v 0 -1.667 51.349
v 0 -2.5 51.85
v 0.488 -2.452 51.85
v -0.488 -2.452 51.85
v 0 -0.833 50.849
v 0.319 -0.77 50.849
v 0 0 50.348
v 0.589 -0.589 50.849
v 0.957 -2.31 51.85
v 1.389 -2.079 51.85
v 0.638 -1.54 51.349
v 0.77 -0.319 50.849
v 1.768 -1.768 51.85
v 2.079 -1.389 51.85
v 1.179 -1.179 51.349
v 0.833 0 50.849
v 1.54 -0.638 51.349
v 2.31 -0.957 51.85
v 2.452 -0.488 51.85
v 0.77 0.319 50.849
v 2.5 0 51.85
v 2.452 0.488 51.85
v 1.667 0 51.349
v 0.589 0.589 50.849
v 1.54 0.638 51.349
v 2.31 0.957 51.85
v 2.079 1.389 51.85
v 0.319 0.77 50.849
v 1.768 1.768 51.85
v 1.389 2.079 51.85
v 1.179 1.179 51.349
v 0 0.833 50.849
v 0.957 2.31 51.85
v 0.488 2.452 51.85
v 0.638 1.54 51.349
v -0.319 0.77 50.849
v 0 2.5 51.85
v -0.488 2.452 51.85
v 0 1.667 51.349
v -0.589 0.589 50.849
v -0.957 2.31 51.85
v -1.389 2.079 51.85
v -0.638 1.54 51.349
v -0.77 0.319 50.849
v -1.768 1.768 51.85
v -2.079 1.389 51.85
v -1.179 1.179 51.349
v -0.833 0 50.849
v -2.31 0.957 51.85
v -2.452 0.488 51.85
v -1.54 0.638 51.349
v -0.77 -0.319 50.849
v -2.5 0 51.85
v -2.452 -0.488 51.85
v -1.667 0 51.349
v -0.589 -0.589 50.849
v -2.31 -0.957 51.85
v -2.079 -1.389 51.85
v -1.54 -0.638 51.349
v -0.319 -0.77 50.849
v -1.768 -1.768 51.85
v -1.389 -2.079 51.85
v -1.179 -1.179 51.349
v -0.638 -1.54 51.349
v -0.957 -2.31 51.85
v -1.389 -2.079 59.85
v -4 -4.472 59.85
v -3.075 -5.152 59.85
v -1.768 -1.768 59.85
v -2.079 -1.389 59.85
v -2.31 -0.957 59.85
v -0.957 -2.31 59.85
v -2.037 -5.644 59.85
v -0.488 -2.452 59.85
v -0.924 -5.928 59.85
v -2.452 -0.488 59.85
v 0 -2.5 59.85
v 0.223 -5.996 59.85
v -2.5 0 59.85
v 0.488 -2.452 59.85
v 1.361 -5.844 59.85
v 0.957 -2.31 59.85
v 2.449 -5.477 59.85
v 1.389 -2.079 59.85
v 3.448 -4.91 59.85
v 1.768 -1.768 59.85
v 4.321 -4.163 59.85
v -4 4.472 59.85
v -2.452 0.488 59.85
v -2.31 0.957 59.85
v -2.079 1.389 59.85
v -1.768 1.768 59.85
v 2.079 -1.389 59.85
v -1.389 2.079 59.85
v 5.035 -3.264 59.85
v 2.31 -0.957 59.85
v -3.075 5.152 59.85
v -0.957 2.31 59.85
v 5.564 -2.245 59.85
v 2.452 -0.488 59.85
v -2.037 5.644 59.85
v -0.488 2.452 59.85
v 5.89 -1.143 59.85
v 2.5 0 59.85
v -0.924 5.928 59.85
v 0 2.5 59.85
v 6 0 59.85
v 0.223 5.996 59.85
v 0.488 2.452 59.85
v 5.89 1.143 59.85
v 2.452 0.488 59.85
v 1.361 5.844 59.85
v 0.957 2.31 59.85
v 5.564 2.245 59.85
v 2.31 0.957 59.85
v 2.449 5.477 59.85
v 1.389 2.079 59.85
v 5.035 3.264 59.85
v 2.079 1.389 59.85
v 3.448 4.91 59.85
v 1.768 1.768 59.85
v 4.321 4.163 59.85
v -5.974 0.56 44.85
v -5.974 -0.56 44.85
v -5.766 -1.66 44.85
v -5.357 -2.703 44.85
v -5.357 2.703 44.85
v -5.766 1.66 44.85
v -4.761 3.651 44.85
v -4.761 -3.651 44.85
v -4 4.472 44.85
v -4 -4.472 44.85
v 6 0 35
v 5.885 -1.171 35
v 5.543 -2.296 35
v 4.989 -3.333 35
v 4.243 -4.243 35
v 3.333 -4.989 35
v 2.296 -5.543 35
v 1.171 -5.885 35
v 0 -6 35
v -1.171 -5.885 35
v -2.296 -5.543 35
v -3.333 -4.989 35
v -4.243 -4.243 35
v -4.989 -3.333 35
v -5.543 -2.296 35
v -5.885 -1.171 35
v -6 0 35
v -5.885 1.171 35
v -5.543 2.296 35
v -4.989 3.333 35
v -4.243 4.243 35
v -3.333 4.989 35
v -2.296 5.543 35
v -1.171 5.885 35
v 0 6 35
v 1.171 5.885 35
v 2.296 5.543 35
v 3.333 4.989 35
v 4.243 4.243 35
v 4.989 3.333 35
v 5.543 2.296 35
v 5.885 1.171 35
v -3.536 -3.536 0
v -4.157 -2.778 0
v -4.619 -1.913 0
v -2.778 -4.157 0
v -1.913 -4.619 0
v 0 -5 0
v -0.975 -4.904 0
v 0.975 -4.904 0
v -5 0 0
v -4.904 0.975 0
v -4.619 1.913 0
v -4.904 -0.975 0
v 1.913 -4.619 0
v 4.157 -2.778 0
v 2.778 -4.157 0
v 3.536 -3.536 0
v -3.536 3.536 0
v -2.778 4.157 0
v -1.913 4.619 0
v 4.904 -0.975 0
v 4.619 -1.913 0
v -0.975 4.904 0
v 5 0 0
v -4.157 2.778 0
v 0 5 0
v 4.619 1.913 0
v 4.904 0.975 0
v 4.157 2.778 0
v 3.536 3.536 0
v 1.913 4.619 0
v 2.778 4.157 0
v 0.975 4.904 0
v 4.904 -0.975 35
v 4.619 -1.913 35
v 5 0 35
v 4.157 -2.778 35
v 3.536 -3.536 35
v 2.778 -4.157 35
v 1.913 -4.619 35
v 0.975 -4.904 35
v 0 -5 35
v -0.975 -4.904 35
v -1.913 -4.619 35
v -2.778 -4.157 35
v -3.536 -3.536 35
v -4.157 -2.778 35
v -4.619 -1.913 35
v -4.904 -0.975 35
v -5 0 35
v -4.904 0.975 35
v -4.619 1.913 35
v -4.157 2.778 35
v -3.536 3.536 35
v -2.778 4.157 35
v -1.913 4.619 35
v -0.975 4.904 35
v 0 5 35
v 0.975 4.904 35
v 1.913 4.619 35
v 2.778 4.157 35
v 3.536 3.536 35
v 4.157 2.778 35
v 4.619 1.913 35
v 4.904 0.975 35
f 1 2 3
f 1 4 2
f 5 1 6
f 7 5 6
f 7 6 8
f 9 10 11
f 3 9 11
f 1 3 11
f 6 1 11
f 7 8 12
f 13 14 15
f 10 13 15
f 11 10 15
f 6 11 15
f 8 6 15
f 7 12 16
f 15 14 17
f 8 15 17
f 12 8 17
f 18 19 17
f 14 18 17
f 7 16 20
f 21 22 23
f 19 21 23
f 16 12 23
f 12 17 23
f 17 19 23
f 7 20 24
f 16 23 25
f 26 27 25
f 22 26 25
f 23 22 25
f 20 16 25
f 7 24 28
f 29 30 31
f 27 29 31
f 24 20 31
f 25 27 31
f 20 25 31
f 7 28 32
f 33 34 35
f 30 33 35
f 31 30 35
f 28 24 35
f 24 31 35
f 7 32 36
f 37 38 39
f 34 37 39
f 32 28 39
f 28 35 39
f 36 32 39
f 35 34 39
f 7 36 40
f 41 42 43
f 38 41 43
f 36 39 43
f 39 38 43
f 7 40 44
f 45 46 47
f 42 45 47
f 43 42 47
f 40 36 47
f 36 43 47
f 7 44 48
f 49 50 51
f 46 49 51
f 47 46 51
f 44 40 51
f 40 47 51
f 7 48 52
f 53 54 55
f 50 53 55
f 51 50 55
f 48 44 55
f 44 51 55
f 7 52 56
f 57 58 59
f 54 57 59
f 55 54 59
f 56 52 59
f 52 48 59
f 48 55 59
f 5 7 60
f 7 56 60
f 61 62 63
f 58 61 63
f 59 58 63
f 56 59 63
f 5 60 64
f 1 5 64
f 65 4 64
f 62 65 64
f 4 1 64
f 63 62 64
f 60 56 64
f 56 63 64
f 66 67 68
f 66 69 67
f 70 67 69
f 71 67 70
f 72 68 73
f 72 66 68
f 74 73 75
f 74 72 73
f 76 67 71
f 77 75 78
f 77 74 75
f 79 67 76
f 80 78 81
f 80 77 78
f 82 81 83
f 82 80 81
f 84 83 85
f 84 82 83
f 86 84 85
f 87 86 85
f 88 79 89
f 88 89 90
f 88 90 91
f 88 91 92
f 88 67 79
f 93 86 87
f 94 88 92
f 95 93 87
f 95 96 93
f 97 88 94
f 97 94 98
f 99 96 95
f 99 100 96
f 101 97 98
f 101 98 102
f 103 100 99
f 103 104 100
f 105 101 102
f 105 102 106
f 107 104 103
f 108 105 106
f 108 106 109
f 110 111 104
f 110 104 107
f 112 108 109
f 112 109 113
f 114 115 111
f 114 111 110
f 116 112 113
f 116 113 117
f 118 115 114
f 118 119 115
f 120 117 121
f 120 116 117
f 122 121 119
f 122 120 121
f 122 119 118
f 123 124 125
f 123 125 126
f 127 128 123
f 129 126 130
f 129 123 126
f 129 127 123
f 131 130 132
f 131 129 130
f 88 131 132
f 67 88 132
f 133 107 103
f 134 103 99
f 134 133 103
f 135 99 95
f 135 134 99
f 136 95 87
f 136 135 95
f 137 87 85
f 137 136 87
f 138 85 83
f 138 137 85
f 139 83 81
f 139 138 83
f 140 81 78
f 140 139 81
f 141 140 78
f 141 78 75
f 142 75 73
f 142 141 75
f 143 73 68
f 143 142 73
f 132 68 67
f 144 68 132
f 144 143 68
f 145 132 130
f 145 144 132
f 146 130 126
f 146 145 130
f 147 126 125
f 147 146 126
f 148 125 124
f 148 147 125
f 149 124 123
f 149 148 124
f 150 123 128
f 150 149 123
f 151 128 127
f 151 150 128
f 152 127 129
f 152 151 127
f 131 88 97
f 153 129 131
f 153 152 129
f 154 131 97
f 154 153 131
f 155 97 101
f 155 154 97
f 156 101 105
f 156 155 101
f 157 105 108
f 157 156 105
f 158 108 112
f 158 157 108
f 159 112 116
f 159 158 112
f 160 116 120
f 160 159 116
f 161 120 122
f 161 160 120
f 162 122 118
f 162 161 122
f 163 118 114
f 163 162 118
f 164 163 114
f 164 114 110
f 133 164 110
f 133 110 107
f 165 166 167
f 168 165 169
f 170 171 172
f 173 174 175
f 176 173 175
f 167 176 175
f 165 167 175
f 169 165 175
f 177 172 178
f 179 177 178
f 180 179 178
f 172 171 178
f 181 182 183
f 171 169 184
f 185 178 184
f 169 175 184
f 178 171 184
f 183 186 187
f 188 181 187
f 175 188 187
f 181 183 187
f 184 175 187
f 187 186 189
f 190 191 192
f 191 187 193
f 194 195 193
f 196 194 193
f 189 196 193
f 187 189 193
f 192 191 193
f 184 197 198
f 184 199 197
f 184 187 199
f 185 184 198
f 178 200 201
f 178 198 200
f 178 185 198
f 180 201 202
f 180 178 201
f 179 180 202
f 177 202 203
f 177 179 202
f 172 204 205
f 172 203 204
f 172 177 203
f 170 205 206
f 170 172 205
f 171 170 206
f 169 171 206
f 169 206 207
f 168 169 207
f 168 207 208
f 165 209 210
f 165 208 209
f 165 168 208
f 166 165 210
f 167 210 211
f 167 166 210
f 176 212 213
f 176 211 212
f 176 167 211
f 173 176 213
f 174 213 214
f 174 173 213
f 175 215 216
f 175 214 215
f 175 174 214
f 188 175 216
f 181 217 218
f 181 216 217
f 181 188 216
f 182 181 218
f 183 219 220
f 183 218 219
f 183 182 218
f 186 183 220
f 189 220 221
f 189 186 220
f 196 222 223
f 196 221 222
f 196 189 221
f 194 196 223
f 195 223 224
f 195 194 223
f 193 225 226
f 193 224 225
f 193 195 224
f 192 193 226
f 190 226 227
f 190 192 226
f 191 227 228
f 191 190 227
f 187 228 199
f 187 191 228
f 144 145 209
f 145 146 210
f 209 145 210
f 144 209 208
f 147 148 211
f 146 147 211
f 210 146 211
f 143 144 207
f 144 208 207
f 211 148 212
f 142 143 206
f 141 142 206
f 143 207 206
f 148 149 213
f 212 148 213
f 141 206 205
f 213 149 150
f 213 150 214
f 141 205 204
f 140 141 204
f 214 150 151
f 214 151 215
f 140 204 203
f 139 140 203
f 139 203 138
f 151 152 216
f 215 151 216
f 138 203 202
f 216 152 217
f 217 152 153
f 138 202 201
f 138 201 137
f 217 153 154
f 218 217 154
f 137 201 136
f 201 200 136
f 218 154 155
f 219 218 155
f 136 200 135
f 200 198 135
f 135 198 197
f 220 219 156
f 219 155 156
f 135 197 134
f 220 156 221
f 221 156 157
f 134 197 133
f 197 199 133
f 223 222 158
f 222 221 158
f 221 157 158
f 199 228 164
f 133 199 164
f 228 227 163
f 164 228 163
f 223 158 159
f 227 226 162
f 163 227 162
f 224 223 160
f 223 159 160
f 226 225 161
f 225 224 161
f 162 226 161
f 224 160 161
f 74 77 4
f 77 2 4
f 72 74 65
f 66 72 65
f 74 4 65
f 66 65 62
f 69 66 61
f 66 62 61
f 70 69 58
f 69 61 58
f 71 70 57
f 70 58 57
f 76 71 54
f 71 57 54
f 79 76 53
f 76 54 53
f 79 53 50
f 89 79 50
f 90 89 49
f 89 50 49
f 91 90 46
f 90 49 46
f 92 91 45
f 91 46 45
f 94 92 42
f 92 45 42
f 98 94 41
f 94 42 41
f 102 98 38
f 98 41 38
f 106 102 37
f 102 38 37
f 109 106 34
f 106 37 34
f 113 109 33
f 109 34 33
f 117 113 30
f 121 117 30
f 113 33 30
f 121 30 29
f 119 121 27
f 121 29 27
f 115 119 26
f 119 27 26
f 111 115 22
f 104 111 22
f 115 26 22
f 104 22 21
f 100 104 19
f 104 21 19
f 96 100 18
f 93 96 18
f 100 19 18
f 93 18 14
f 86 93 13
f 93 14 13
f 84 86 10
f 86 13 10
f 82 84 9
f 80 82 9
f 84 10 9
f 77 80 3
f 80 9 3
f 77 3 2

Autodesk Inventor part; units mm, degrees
ref_plane "YZ Plane" through (0, 0, 0) normal (1, 0, 0) x (0, 1, 0)
ref_plane "XZ Plane" through (0, 0, 0) normal (0, 1, 0) x (-1, 0, 0)
sketch "スケッチ1" plane through (0, 0, 0) normal (0, 0, 1) x (1, 0, 0)
  point P0 (0, 0)
sketch "スケッチ2" plane through (0, 0, 0) normal (0, 0, 1) x (1, 0, 0)
  circle A0 centre (0, 0) radius 5
  dimension "d0" = 10
extrude "押し出し1" add sketch "スケッチ2" along normal blind 35
thread "ねじ1" size "M10x1.5" class "6g" standard "ANSI Metric M Profile" length 10
sketch "スケッチ3" plane through (0, 0, 35) normal (0, 0, 1) x (1, 0, 0)
  point P0 (0, 0)
sketch "スケッチ4" plane through (0, 0, 35) normal (0, 0, 1) x (1, 0, 0)
  circle A0 centre (0, 0) radius 6
  dimension "d5" = 12
extrude "押し出し2" add sketch "スケッチ4" along normal blind 24.85
sketch "スケッチ5" plane through (0, 0, 59.85) normal (0, 0, 1) x (1, 0, 0)
  line L0 (0, 0) -> (0, 6)
  circle A0 centre (0, 0) radius 6 projected
ref_plane "作業平面1" through (0, 6, 59.85) normal (0, 1, 0) x (-1, 0, 0)
sketch "スケッチ9" plane through (0, 0, 59.85) normal (0, 0, 1) x (1, 0, 0)
  point P0 (0, 0)
  point P1 (0, 0)
hole "穴2" at (0, 0, 59.85) direction (0, 0, -1) diameter 5 depth 8 tip angle 118
thread "ねじ3" size "M5x0.8" class "6H" standard "ANSI Metric M Profile" full length
sketch "スケッチ10" plane through (0, 0, 59.85) normal (0, 0, 1) x (1, 0, 0)
  arc A0 (-4, 4.4721) -> (-4, -4.4721) centre (0, 0) ccw
  line L0 (-4, 0) -> (-4, 4.4721)
  line L1 (-4, 0) -> (-4, -4.4721)
  dimension "d34" = 12
  dimension "d35" = 4
extrude "押し出し4" cut sketch "スケッチ10" against normal blind 15
properties part number "回転アーム付き計測輪シャフト"
